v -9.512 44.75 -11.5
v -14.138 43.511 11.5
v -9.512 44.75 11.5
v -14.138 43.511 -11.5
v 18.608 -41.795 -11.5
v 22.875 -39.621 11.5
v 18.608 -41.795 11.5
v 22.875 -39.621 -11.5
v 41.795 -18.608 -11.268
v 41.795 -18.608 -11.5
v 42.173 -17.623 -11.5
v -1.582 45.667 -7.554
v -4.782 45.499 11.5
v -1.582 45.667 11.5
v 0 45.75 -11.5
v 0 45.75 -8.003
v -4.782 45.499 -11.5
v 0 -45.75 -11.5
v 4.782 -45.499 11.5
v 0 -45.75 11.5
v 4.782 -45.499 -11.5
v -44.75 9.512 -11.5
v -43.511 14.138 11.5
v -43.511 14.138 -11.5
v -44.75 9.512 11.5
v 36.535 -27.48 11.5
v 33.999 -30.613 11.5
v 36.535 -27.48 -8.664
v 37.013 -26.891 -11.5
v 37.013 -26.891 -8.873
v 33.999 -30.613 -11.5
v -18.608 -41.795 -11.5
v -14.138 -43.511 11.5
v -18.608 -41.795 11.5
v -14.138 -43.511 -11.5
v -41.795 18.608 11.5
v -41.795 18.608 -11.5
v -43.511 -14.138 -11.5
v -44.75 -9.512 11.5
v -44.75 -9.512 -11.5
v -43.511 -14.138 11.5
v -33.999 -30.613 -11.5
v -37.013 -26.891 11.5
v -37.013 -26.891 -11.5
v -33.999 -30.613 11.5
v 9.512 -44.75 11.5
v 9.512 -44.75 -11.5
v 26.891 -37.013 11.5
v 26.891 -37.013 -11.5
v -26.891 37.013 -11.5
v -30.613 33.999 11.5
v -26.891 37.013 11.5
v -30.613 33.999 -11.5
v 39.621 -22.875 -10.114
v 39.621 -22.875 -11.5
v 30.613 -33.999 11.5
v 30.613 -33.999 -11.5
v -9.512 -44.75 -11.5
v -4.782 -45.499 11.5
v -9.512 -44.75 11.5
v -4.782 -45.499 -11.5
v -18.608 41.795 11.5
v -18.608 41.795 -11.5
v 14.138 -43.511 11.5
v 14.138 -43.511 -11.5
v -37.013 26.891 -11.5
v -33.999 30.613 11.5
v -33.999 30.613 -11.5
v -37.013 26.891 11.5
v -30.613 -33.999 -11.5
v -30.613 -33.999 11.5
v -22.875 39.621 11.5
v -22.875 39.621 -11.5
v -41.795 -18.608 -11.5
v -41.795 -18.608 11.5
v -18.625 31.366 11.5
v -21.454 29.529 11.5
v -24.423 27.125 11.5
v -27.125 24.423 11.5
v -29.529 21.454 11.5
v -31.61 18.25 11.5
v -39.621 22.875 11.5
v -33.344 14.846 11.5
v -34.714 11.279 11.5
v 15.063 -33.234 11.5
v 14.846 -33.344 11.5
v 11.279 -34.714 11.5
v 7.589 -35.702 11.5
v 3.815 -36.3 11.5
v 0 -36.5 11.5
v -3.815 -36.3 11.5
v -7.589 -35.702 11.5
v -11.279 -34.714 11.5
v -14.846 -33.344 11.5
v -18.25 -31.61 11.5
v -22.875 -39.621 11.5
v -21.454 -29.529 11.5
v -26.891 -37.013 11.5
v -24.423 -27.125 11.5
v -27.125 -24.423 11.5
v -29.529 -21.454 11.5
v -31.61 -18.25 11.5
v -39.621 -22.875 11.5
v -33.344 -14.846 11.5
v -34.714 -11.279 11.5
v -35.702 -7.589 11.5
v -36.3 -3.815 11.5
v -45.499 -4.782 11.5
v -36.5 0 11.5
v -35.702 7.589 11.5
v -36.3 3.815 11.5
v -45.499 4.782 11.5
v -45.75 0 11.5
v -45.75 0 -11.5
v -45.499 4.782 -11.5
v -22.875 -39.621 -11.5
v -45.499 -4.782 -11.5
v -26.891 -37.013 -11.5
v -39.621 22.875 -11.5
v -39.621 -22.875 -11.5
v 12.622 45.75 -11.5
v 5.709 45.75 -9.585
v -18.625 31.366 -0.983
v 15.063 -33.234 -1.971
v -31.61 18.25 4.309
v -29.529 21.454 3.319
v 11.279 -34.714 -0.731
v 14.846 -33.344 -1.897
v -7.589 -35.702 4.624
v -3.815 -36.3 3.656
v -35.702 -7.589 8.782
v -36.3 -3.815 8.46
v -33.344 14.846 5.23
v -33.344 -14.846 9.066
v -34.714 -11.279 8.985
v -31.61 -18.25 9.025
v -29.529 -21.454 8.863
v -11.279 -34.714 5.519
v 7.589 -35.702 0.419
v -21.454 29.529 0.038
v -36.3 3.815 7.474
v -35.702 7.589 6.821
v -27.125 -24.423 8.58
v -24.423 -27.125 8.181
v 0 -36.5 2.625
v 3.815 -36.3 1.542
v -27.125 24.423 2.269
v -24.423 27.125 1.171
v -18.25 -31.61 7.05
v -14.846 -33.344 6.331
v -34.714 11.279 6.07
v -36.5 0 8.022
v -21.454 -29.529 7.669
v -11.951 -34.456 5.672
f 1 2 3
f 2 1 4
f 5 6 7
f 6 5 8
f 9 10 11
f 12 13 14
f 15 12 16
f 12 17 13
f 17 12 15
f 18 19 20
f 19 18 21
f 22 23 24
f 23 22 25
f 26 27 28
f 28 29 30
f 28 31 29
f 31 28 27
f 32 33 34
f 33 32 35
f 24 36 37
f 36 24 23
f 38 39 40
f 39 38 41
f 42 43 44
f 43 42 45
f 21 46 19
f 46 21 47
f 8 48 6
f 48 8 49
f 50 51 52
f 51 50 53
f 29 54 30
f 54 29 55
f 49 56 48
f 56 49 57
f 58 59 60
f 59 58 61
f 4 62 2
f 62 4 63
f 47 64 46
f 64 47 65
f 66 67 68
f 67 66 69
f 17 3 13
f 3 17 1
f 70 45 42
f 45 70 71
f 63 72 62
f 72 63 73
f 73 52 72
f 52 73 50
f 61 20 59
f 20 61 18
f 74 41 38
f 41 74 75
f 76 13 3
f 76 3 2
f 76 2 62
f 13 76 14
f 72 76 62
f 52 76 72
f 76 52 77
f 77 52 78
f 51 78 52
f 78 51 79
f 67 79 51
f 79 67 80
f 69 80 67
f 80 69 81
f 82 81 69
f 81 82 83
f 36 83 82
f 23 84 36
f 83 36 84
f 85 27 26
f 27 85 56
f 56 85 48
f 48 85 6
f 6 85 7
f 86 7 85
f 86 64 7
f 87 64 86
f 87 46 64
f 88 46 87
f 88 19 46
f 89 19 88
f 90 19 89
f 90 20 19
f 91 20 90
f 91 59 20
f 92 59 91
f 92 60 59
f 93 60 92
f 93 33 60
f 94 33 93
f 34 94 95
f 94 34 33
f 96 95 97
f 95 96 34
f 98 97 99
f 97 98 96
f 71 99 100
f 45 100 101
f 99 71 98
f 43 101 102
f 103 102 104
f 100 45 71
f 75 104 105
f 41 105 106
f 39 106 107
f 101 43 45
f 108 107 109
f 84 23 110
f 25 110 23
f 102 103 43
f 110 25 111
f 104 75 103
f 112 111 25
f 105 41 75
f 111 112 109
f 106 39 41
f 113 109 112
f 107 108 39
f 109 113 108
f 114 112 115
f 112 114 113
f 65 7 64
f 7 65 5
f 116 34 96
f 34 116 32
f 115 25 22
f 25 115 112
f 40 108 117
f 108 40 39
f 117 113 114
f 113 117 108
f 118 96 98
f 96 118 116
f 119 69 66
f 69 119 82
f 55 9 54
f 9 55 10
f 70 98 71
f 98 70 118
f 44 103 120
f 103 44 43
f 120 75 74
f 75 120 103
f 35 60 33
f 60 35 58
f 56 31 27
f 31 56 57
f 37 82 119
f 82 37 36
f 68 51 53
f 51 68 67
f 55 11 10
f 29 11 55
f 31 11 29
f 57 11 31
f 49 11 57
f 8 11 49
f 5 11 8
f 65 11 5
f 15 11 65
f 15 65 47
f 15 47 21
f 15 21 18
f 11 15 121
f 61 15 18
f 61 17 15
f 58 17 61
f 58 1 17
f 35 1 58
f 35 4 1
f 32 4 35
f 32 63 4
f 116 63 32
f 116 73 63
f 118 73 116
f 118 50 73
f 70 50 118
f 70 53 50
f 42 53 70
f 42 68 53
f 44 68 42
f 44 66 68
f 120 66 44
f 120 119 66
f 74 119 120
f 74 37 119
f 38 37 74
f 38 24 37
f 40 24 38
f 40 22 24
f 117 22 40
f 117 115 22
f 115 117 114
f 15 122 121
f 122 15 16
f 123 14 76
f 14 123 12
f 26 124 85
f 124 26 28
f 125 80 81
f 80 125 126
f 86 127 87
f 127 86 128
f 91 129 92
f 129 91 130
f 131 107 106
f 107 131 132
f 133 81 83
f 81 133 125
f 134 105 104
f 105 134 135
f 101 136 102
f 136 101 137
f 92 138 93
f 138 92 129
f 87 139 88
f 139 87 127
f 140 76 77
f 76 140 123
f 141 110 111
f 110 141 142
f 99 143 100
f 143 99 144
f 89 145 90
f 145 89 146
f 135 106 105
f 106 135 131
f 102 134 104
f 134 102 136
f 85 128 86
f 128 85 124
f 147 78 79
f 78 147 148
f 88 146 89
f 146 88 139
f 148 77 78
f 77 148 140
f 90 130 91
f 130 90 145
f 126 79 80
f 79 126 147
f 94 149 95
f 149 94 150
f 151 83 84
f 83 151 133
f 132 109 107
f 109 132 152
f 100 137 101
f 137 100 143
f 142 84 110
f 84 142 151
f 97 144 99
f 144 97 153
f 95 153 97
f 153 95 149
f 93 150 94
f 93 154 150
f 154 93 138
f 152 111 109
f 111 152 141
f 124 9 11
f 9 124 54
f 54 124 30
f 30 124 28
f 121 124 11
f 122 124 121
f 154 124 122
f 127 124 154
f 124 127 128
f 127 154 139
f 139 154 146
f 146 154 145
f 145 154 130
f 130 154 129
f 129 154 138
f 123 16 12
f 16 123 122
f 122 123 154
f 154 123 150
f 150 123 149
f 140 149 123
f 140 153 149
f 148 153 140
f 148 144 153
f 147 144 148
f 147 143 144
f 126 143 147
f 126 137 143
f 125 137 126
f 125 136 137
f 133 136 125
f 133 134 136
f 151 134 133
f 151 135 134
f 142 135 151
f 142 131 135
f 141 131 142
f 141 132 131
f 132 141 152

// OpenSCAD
//$fa = 1;
//$fs = 0.5;

thickness=23;
inner_diameter=91.5;
hole_diameter=73;
smooth=60;
difference(){
    union(){
        cylinder(thickness, d=inner_diameter, center=true, $fn=smooth);
            translate([0,0,-thickness/2.0]) {
                cube([inner_diameter/2.0, inner_diameter/2.0, thickness]);
        };
    };
    difference(){
        union(){
            // middle cut
            translate([0,0,-12]) {
                //sphere(d=hole_diameter);
                cylinder(100, d=hole_diameter, $fn=smooth);
            }
            translate([0,-10,-12]) {        
                cube([80, 80, 100]);
            }
            translate([0,-10,-10]) {        
                cube([80, 80, 100]);
            }
            // sides cut
            union(){
                rotate(40){
                    translate([0,6,-12]) {
                        cube([30,30,60]);
                    }
                };
                rotate(15){
                    translate([0,-36,-12]) {
                        cube([50,30,60]);
                    }
                }
            }                                               
        }
        
        // ramp
        rotate([0,17,25]){
            translate([-45,-50,-42]) {
                cube([80,100,40]);
            }
}        
        
    }    
}



/*
// central rounded cone
union(){
    cylinder(h=23, d1=40, d2=20, center=true, $fn=smooth);
    translate([0, 0, 11]) {
        sphere(d=20, $fn=smooth);
    }
}*/
